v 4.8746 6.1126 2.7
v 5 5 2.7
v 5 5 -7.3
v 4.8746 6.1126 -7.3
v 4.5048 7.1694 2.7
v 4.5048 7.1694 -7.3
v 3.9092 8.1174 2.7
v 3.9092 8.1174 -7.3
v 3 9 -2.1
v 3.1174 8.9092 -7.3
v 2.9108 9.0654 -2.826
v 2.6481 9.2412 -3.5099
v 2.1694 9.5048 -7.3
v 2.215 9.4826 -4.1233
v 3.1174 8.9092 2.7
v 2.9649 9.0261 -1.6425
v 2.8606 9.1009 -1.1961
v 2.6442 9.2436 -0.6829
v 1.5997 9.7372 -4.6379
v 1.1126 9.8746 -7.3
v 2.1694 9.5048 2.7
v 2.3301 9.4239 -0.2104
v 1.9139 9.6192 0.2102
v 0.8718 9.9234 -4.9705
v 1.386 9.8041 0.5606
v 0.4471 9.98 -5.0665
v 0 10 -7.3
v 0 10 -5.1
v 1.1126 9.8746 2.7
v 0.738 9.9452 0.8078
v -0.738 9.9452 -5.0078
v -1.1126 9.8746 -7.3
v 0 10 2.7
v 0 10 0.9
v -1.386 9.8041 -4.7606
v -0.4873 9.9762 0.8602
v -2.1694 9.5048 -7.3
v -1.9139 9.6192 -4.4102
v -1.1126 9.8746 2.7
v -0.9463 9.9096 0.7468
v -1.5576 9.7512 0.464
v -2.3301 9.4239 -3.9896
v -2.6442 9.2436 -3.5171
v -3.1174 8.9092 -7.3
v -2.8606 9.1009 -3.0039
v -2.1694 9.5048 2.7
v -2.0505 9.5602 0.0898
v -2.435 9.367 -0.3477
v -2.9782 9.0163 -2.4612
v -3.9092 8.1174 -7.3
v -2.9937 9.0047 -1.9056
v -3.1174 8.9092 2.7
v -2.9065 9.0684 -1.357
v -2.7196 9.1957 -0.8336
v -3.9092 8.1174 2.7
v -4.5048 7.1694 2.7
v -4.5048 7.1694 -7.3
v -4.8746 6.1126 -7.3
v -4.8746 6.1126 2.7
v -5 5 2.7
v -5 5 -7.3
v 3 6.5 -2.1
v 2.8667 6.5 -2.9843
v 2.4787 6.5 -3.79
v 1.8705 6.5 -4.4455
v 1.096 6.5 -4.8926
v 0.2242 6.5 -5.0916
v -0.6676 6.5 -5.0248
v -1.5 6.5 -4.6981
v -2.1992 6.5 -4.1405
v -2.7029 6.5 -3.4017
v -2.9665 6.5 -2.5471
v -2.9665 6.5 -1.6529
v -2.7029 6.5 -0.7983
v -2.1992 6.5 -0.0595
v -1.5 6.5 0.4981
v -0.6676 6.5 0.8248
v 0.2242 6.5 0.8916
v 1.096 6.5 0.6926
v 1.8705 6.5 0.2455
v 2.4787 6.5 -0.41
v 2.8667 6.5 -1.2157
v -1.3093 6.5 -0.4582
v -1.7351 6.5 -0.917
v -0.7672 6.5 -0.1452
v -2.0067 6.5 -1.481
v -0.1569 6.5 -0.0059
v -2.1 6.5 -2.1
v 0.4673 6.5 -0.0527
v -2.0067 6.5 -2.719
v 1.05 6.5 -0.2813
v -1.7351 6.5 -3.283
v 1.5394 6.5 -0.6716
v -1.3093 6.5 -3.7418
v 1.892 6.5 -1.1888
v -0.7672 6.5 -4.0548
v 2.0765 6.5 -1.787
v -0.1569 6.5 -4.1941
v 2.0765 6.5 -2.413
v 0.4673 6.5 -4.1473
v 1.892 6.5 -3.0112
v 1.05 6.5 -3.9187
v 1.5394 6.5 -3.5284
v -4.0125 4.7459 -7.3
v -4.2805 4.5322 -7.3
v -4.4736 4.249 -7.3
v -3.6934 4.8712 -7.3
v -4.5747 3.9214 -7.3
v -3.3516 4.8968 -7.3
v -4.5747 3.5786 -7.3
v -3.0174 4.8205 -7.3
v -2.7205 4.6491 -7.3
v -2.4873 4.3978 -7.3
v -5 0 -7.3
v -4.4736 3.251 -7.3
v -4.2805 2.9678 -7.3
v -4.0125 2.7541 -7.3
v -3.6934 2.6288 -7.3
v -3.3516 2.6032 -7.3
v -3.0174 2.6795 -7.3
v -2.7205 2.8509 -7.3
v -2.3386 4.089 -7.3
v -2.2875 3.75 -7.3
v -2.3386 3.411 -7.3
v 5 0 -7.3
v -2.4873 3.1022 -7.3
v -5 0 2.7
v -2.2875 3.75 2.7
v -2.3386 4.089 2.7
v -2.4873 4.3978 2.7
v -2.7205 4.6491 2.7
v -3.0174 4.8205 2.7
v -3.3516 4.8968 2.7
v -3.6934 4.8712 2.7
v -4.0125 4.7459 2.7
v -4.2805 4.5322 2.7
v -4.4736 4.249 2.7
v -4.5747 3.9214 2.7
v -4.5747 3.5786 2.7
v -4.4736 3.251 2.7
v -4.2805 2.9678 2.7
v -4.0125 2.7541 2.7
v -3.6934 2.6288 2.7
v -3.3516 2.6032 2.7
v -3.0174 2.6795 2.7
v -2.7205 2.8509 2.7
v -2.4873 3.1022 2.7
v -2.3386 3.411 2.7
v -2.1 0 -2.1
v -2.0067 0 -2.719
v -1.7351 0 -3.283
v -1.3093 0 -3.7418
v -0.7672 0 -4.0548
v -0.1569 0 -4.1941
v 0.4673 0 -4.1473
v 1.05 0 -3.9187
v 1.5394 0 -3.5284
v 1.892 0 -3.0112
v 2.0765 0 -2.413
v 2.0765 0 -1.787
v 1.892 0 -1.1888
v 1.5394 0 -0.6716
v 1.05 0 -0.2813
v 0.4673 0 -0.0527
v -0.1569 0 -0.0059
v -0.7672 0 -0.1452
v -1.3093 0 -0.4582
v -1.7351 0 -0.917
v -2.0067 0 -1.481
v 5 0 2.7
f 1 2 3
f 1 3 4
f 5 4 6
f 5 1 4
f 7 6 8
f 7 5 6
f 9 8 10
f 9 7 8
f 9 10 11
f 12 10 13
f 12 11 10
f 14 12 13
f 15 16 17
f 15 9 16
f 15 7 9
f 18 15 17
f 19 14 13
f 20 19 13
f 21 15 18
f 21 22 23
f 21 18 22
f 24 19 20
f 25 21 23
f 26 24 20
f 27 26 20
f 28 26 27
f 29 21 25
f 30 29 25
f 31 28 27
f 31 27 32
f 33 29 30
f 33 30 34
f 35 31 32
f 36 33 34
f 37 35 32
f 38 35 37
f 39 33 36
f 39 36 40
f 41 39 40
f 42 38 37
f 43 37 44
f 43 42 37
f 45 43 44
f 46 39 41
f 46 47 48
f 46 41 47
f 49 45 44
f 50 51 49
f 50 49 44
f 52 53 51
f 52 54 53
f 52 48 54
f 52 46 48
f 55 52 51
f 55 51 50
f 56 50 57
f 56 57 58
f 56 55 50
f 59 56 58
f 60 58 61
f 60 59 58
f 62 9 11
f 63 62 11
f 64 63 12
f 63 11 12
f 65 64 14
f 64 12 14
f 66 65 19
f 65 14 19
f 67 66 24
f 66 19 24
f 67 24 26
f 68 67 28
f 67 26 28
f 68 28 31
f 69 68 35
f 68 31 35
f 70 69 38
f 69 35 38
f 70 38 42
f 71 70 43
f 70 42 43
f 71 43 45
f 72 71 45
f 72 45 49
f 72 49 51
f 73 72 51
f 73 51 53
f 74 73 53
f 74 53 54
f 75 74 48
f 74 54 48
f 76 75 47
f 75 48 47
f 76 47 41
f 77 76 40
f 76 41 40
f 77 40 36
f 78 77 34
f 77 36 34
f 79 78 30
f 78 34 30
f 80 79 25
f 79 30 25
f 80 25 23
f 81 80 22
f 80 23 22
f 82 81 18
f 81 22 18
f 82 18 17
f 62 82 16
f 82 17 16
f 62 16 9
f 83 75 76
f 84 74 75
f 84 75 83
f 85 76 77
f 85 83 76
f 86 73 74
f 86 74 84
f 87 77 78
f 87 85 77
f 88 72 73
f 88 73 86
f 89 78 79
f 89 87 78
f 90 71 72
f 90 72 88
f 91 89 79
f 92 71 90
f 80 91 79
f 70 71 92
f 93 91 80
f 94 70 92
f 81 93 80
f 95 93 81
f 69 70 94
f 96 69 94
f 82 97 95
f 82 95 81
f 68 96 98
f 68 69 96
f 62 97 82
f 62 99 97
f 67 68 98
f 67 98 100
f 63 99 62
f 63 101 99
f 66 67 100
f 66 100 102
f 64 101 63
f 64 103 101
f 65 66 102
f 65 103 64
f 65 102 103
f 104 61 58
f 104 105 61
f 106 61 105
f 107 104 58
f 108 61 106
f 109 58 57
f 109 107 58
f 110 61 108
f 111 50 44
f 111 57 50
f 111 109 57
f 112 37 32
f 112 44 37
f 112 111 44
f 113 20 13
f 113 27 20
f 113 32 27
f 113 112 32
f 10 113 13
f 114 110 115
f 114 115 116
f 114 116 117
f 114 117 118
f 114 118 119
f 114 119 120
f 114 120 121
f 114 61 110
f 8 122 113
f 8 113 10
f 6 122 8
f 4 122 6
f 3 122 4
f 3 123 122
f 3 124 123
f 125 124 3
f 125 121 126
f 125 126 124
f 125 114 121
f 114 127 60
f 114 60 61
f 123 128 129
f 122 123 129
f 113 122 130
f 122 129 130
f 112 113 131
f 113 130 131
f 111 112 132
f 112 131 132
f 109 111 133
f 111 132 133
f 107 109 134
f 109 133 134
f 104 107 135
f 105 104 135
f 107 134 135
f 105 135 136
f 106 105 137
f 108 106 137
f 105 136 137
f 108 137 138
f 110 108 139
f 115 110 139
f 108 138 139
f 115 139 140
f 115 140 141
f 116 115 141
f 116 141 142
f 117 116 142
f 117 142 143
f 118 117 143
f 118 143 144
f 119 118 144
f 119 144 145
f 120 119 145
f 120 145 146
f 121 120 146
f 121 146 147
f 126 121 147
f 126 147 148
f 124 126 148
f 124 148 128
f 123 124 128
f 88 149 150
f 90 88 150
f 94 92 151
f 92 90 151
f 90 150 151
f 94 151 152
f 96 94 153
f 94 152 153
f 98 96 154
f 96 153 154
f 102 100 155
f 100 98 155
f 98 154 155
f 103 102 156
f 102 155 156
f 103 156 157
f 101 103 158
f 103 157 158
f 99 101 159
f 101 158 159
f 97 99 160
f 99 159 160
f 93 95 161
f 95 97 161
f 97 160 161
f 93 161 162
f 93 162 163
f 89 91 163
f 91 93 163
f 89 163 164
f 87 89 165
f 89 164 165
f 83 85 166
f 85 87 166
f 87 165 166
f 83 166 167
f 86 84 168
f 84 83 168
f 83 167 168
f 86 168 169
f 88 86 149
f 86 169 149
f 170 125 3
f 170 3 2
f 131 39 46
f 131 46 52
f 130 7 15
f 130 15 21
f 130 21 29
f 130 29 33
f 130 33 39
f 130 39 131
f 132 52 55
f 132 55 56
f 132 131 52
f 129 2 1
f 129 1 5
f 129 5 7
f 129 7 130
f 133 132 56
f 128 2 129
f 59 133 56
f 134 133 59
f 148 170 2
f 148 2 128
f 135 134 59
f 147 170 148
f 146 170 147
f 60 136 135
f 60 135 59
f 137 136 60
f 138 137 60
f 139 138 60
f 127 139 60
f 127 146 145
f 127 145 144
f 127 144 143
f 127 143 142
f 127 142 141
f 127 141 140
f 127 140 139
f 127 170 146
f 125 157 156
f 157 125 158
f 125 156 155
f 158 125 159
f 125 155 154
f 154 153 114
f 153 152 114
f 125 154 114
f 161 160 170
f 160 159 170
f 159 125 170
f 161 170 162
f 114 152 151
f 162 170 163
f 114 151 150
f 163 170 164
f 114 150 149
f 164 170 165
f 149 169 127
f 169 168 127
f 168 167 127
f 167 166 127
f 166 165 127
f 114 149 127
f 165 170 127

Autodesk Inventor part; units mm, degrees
ref_plane "YZ Plane" through (0, 0, 0) normal (1, 0, 0) x (0, 1, 0)
ref_plane "XZ Plane" through (0, 0, 0) normal (0, 1, 0) x (-1, 0, 0)
ref_plane "XY Plane" through (0, 0, 0) normal (0, 0, 1) x (1, 0, 0)
sketch "Sketch1" plane through (0, 0, 0) normal (0, 1, 0) x (-1, 0, 0)
  line L0 (0, 0) -> (0, -4.2)
  circle A0 centre (0, -2.1) radius 2.1
  line L1 (0, -2.1) -> (0, -6.9)
  line L2 (0, -6.9) -> (0, 2.7)
  line L3 (0, 2.7) -> (5, 2.7)
  line L4 (5, 2.7) -> (5, -7.3)
  line L5 (5, -7.3) -> (-5, -7.3)
  line L6 (-5, -7.3) -> (-5, 2.7)
  line L7 (-5, 2.7) -> (0, 2.7)
  dimension "d0" = 4.2
  dimension "d1" = 4.8
  dimension "d2" = 9.6
  dimension "d3" = 5
  dimension "d4" = 10
extrude "Extrusion1" add sketch "Sketch1" along normal blind 10
sketch "Sketch2" plane through (0, 10, 0) normal (0, 1, 0) x (1, 0, 0)
  circle A0 centre (0, 2.1) radius 2.1 projected
  circle A1 centre (0, 2.1) radius 3
  point P0 (0, 0)
  dimension "d7" = 6
extrude "Extrusion2" cut sketch "Sketch2" against normal blind 3.5 contours A0 | A1
fillet "Fillet1" radius 5 2 edges at (5, 10, -2.3) (-5, 10, -2.3)
sketch "Sketch3" plane through (-5, 0, 2.7) normal (0, 0, 1) x (1, 0, 0)
  arc A0 (10, 5) -> (0, 5) centre (5, 5) ccw projected
  line L0 (5, 5) -> (5, 10)
  line L1 (5, 5) -> (5, 0)
  line L2 (5, 0) -> (5, 5)
  line L3 (0, 0) -> (0, 5) projected
  line L4 (5, 5) -> (0, 5)
  line L5 (0, 5) -> (2.5, 5)
  line L6 (2.5, 5) -> (2.5, 0)
  line L7 (2.5, 0) -> (2.5, 2.5)
  line L8 (1.25, 5) -> (1.25, 0)
  line L9 (0, 0) -> (10, 0) projected
  line L10 (2.5, 2.5) -> (1.25, 2.5)
  line L11 (1.875, 5) -> (1.875, 2.5)
  circle A1 centre (1.875, 2.5) radius 1.15
  line L12 (1.25, 5) -> (1.875, 5)
  line L13 (1.5625, 5) -> (1.5625, 2.5)
  line L14 (1.5625, 2.5) -> (1.5625, 3.75)
  circle A2 centre (1.5625, 3.75) radius 1.15
  line L15 (1.5625, 3.75) -> (0.4125, 3.75)
  line L16 (0.4125, 3.75) -> (0, 3.75)
  dimension "d14" = 2.3
extrude "Extrusion3" cut sketch "Sketch3" against normal through all contours L15 L8 A1 A2 | A2 L8 L15 | A2 L13 L15 L8 | A2 A1 L6 | L6 A1 L11 A2 | A1 L8 A2 | L15 L13 A1 L8 | A2 L11 A1 L13 | A1 A2 L6 | L6 A2 L11 A1 | A1 L13 A2 L8 | L11 A2 L13 A1 picked at (2.5388, 4.0306) picked at (1.186, 3.1393) picked at (2.5186, 3.2399)
properties part number "pist"
